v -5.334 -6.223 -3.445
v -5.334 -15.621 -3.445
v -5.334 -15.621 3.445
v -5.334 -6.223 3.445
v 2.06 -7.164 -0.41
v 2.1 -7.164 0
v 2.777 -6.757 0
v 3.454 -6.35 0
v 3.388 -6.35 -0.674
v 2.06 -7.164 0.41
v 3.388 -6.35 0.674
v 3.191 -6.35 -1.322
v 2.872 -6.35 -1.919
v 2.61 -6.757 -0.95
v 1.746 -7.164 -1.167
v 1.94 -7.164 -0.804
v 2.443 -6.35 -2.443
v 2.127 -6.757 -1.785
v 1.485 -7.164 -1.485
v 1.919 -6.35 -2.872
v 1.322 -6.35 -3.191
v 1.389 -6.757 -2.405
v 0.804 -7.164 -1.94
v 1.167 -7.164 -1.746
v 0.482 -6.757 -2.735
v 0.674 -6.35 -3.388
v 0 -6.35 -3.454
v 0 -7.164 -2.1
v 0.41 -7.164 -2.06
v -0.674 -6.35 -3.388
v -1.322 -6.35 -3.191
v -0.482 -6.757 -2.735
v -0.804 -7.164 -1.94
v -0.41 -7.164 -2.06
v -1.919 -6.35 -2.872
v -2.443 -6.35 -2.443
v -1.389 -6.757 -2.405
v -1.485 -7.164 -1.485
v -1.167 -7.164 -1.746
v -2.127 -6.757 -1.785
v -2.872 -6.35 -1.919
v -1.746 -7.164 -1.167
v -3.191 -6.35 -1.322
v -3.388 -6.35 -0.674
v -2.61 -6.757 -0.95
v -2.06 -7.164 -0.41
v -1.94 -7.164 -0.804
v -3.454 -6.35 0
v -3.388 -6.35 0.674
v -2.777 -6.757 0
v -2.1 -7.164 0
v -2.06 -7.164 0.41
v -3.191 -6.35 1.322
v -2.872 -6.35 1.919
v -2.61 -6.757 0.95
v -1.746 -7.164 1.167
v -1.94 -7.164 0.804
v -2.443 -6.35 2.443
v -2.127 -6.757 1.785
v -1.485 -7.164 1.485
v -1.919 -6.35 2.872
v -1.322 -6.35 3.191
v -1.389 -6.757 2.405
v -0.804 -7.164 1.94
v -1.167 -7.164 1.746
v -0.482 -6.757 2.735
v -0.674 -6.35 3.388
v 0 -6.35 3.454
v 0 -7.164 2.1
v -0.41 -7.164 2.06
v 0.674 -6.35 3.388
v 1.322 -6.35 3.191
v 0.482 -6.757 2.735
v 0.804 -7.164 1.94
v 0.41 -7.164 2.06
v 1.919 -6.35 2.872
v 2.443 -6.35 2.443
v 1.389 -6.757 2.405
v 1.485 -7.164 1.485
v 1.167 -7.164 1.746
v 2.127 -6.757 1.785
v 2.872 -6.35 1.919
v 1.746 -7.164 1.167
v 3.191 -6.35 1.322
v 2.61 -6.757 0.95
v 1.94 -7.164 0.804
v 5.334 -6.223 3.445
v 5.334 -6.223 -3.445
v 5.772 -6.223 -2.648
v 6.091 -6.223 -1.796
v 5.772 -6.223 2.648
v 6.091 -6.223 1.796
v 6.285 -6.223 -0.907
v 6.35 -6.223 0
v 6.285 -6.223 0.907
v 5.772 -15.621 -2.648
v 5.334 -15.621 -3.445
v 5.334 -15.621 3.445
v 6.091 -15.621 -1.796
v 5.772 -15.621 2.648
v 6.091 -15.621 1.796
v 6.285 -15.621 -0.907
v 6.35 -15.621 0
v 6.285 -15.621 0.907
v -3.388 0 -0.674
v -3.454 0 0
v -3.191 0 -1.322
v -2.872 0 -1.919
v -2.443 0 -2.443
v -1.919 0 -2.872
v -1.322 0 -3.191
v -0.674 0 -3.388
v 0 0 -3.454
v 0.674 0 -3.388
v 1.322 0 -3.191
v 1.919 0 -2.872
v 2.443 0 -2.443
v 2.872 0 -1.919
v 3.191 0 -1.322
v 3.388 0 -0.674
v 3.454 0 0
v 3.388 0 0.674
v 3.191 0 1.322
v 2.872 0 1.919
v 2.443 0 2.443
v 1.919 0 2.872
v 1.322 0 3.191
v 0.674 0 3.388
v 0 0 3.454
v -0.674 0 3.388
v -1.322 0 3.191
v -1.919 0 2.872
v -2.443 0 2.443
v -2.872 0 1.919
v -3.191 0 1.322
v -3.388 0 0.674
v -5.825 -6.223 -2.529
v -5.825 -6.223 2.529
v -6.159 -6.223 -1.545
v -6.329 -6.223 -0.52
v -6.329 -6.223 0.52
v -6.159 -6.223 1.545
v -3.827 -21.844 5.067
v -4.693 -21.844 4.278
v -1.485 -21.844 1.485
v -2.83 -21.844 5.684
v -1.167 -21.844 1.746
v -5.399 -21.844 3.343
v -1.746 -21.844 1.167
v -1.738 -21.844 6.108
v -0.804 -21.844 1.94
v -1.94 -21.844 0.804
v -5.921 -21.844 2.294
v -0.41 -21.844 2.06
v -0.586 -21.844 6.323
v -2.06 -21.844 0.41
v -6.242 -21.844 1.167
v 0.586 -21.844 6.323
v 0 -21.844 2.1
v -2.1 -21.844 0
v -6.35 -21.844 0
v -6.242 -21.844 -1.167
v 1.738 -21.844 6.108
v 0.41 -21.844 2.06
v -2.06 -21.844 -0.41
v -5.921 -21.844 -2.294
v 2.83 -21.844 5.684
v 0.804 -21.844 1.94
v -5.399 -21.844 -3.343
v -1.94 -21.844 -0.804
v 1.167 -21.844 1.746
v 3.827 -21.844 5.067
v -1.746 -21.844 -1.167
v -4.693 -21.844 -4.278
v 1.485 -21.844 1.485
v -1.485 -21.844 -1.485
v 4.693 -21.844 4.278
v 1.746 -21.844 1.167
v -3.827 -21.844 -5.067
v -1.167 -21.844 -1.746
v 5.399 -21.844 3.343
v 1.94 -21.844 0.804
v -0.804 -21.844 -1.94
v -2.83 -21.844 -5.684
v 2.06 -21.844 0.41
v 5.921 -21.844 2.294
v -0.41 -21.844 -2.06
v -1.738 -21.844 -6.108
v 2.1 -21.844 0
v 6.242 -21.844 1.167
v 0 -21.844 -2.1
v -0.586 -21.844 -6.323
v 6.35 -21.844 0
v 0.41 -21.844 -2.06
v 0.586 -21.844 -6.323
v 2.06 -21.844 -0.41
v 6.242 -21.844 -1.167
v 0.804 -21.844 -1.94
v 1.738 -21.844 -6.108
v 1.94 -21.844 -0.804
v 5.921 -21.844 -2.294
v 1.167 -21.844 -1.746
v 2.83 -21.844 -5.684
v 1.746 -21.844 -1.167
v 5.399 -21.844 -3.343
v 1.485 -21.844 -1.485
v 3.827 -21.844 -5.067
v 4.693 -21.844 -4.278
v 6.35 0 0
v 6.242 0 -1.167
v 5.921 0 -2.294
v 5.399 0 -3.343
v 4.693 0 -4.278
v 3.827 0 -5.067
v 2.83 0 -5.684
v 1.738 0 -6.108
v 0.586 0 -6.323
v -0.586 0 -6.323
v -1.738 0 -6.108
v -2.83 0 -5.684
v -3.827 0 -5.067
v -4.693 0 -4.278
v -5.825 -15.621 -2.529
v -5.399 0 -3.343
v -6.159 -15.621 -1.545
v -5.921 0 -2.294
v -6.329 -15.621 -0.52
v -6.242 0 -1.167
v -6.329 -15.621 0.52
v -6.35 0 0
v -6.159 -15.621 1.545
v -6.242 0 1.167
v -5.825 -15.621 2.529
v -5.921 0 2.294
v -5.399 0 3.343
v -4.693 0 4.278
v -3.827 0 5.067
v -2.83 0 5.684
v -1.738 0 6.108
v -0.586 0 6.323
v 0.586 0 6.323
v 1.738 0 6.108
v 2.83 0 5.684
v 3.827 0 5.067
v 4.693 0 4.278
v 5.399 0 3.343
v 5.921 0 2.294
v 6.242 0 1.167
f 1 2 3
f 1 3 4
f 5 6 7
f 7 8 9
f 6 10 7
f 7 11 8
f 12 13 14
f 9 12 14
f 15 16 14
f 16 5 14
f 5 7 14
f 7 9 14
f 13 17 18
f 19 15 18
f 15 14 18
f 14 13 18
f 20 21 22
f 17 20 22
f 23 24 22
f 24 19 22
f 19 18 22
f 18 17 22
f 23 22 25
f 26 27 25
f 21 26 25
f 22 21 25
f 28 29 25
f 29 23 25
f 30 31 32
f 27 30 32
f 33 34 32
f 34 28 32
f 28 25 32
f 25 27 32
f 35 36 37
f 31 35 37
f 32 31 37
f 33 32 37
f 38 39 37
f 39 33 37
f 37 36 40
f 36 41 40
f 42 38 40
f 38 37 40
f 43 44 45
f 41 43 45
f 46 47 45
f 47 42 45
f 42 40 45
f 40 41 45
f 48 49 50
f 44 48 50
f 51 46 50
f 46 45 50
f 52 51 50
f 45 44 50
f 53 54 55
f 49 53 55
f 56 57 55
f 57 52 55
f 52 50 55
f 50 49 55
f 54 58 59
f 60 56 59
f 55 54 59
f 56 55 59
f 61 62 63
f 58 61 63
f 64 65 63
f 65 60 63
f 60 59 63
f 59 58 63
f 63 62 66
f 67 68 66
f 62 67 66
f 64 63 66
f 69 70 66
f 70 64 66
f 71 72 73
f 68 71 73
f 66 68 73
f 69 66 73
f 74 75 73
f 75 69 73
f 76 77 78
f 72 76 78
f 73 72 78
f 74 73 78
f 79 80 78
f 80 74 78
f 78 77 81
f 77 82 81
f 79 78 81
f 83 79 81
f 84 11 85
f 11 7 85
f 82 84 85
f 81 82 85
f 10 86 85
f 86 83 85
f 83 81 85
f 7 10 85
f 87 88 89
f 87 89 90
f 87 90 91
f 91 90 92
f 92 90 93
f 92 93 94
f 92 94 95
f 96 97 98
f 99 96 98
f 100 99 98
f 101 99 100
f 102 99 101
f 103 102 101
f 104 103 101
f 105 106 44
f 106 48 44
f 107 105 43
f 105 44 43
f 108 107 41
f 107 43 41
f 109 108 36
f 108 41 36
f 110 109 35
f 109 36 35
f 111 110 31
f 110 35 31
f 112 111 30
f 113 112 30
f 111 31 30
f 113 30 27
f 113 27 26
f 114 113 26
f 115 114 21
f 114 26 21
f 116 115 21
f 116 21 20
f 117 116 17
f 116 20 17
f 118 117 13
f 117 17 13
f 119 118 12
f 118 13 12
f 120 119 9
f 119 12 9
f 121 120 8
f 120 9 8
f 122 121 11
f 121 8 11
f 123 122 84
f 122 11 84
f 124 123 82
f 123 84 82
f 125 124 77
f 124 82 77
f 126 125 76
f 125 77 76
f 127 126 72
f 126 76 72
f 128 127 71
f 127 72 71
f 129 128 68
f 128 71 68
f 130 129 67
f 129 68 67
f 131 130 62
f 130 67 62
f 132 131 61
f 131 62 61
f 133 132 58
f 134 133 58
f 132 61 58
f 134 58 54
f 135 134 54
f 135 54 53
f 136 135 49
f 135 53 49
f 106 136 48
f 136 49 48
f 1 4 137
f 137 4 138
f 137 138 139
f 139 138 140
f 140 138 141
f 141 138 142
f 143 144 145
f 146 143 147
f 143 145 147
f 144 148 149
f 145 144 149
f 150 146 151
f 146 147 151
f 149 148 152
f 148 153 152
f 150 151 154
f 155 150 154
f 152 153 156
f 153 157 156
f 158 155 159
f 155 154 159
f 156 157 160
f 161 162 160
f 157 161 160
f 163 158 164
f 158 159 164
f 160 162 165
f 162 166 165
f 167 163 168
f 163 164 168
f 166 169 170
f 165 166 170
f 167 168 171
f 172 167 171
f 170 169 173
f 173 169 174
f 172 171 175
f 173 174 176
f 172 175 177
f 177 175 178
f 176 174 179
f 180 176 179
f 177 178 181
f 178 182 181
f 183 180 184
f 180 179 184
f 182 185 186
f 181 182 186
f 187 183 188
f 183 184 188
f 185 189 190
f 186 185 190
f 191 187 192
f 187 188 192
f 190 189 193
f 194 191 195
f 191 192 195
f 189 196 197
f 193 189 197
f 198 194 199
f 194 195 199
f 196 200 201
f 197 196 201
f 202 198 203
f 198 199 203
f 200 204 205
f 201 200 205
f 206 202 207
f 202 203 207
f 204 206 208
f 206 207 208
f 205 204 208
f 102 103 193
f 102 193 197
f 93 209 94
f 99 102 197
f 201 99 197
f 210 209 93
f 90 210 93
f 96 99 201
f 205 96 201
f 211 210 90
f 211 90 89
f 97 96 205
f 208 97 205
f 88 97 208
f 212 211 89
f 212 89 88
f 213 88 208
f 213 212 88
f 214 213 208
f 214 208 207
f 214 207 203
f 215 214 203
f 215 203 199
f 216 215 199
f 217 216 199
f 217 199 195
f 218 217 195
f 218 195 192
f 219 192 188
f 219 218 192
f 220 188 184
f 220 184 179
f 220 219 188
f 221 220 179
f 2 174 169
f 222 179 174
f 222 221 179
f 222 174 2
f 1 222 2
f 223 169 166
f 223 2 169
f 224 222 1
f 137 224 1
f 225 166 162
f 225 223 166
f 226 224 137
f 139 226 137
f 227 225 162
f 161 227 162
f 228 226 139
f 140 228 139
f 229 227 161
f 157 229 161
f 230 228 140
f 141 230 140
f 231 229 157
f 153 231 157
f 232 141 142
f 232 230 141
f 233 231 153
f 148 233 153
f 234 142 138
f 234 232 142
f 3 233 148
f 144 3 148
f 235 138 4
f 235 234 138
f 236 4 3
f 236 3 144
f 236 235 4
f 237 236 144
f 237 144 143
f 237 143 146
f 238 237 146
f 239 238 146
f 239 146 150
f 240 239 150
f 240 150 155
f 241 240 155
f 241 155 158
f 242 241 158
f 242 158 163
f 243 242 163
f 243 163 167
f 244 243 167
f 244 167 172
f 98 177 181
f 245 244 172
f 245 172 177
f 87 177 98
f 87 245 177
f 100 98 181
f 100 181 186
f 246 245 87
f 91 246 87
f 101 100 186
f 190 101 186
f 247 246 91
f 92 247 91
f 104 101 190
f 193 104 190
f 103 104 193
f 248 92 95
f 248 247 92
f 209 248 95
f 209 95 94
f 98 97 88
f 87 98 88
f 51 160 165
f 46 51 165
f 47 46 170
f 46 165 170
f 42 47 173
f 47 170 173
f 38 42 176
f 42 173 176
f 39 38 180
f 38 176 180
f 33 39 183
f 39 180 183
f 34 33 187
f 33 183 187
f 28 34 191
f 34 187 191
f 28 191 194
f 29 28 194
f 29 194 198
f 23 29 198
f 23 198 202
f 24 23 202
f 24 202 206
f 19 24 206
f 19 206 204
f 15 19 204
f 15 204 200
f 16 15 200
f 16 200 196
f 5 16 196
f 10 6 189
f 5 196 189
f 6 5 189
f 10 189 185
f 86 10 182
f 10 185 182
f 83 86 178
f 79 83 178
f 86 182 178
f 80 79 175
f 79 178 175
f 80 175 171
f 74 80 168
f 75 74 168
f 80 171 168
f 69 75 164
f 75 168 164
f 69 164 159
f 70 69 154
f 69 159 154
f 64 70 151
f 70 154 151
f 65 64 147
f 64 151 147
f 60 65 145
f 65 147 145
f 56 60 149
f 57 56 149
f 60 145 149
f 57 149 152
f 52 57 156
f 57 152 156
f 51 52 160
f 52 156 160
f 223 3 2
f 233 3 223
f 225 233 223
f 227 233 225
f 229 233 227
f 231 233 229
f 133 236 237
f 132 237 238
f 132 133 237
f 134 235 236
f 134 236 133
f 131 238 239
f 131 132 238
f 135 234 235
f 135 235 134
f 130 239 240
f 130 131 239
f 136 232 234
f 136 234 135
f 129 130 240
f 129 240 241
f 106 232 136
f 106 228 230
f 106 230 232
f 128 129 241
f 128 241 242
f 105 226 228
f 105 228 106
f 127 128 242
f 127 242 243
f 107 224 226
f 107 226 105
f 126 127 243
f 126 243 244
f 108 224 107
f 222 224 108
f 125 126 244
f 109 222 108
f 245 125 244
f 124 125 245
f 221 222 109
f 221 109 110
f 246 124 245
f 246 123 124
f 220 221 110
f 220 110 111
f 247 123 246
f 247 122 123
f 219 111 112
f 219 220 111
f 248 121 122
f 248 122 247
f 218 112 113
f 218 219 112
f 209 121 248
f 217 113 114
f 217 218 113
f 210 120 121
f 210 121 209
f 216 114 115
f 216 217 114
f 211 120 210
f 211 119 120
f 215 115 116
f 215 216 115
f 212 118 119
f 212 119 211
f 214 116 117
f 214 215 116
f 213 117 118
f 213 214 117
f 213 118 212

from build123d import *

# Parameters (mm, degrees)
SKETCH1_R                    = 6.35
BOSS_EXTRUDE1_DEPTH          = 21.844
SKETCH4_W                    = 4.630102794
SKETCH4_H                    = 9.398
SKETCH4_W_2                  = 5.584398789
CUT_EXTRUDE5_DEPTH           = 13.7
M5X0_8_TAPPED_HOLE2_D        = 4.2
F_5_16_24_TAPPED_HOLE1_D     = 6.9088
F_5_16_24_TAPPED_HOLE1_DEPTH = 6.35
F_5_16_24_TAPPED_HOLE1_TIP   = 2.075612922


with BuildPart() as part:
    # Sketch1 → Boss-Extrude1 (new body)
    with BuildSketch(Plane(origin=(0, 0, 0), x_dir=(1, 0, 0), z_dir=(0, 1, 0))):
        Circle(SKETCH1_R)
    extrude(amount=-BOSS_EXTRUDE1_DEPTH)

    # Sketch4 → Cut-Extrude5 (cut, through all)
    with BuildSketch(Plane(origin=(0, 0, -6.35), x_dir=(-1, 0, 0), z_dir=(0, 0, -1))):
        with Locations((-7.649051397, -10.922)):
            Rectangle(SKETCH4_W, SKETCH4_H)
        with Locations((8.126199395, -10.922)):
            Rectangle(SKETCH4_W_2, SKETCH4_H)
    extrude(amount=-CUT_EXTRUDE5_DEPTH, mode=Mode.SUBTRACT)

    # M5x0.8 Tapped Hole2 (through all)
    with Locations(Plane(origin=(0, 0, 0), x_dir=(1, 0, 0), z_dir=(0, 1, 0))):
        with Locations((0, 0)):
            Hole(M5X0_8_TAPPED_HOLE2_D / 2)

    # 5/16-24 Tapped Hole1
    with Locations(Plane(origin=(0, 0, 0), x_dir=(1, 0, 0), z_dir=(0, 1, 0))):
        with Locations((0, 0)):
            Hole(F_5_16_24_TAPPED_HOLE1_D / 2, depth=F_5_16_24_TAPPED_HOLE1_DEPTH)
            with Locations((0, 0, -(F_5_16_24_TAPPED_HOLE1_DEPTH + F_5_16_24_TAPPED_HOLE1_TIP / 2))):  # 118° drill point
                Cone(0, F_5_16_24_TAPPED_HOLE1_D / 2, F_5_16_24_TAPPED_HOLE1_TIP, mode=Mode.SUBTRACT)


solid = part.part
